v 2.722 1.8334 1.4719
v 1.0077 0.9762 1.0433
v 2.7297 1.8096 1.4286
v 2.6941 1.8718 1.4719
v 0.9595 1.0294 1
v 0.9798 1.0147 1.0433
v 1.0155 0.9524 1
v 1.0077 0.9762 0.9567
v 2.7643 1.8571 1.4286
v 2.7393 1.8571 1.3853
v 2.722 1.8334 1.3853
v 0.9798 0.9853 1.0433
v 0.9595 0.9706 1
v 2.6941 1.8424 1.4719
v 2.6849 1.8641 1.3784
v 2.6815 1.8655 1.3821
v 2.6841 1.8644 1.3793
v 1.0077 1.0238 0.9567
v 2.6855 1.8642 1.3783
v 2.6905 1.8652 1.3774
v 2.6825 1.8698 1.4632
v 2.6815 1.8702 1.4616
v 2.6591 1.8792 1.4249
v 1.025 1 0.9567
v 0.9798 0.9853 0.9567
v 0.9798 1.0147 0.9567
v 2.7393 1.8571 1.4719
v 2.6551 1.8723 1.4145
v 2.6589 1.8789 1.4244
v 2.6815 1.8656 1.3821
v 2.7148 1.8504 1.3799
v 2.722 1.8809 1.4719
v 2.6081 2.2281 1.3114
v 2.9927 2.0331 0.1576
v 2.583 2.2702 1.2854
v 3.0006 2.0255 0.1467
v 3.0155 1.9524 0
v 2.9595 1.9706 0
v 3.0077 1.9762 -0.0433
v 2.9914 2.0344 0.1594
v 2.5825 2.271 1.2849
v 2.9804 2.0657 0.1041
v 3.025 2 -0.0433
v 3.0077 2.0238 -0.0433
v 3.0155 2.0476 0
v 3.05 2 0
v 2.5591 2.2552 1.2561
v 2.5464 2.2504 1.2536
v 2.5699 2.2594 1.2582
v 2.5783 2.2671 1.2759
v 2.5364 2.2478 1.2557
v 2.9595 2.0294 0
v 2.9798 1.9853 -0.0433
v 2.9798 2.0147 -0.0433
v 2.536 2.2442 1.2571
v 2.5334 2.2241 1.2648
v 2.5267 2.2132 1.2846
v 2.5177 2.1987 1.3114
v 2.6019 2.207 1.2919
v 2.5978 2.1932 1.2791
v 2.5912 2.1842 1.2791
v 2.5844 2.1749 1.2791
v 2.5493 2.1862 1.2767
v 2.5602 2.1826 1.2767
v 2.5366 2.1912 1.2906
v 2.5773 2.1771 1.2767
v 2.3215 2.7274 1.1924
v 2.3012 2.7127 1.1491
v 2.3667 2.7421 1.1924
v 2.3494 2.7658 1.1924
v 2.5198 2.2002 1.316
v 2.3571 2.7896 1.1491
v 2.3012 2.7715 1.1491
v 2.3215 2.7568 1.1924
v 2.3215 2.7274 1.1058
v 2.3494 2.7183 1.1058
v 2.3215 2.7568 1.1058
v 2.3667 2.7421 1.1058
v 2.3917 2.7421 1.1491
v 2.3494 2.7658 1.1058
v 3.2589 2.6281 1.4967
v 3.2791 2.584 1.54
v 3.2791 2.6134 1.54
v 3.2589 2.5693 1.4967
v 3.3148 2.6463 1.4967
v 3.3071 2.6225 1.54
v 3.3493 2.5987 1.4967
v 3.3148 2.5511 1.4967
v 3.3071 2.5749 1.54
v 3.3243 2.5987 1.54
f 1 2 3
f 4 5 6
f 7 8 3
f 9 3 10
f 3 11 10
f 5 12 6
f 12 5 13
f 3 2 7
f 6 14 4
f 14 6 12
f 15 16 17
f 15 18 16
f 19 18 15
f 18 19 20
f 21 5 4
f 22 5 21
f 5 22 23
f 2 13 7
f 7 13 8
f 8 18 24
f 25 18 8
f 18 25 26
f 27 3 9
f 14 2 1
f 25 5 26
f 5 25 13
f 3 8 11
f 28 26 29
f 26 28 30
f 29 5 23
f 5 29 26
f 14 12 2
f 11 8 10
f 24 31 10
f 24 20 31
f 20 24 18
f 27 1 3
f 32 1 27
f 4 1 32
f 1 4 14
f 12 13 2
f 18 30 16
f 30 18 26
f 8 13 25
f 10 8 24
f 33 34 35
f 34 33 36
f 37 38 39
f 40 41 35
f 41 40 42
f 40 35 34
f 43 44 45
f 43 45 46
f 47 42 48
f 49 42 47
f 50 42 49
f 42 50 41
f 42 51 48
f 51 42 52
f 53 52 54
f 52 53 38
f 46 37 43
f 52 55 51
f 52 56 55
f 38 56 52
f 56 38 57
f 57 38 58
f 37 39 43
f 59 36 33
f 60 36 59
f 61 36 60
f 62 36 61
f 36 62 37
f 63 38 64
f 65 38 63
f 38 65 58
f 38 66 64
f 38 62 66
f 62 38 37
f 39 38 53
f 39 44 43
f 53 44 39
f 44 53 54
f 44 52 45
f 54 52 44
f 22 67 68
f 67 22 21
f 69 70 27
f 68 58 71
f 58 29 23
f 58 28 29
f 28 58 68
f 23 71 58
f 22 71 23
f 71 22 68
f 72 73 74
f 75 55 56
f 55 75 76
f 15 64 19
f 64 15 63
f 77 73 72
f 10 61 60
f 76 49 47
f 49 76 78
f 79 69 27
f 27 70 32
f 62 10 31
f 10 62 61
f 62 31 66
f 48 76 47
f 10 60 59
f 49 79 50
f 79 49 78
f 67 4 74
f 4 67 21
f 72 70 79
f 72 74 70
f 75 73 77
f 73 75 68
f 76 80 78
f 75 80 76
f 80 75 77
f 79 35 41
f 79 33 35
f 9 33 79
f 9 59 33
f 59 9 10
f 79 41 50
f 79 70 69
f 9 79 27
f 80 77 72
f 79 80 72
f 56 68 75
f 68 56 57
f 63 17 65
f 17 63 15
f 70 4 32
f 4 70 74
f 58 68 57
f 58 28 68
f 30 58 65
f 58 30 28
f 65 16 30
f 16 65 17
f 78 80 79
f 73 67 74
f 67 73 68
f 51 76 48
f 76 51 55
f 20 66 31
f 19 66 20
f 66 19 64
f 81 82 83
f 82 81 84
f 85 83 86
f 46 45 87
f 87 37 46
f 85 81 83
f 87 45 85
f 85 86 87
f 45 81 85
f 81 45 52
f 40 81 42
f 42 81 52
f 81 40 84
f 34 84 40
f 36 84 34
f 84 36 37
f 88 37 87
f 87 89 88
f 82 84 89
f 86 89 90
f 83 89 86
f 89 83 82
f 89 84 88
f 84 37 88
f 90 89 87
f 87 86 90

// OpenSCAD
module line(a,b=[0,0,0], width=0.05){
    hull(){ translate(a) sphere(width); translate(b) sphere(width); }
}
module point(a, width=0.05){
    translate(a) sphere(width);
}
function dot(a,b) = a*b;
function normalize(a) = a/norm(a);

a0=[1,1,1];
a1=[5,3,2];
an=normalize(a1-a0);
b0=[3,2,0];
b1=[4,4,5];
bn=normalize(b1-b0);
%line(a0, a1);
%line(b0, b1);

cn = normalize(cross(bn,an));
projection_ =         dot(b0-a0, an) * an;
rejection   = b0-a0 - dot(b0-a0, an) * an - dot(b0-a0, cn) * cn;
line(a0, a0+projection_);
line(b0, b0-rejection);
line(a0+projection_, a0+projection_+cn);
line(b0, b0-bn*norm(rejection)/dot(bn,normalize(rejection)));
